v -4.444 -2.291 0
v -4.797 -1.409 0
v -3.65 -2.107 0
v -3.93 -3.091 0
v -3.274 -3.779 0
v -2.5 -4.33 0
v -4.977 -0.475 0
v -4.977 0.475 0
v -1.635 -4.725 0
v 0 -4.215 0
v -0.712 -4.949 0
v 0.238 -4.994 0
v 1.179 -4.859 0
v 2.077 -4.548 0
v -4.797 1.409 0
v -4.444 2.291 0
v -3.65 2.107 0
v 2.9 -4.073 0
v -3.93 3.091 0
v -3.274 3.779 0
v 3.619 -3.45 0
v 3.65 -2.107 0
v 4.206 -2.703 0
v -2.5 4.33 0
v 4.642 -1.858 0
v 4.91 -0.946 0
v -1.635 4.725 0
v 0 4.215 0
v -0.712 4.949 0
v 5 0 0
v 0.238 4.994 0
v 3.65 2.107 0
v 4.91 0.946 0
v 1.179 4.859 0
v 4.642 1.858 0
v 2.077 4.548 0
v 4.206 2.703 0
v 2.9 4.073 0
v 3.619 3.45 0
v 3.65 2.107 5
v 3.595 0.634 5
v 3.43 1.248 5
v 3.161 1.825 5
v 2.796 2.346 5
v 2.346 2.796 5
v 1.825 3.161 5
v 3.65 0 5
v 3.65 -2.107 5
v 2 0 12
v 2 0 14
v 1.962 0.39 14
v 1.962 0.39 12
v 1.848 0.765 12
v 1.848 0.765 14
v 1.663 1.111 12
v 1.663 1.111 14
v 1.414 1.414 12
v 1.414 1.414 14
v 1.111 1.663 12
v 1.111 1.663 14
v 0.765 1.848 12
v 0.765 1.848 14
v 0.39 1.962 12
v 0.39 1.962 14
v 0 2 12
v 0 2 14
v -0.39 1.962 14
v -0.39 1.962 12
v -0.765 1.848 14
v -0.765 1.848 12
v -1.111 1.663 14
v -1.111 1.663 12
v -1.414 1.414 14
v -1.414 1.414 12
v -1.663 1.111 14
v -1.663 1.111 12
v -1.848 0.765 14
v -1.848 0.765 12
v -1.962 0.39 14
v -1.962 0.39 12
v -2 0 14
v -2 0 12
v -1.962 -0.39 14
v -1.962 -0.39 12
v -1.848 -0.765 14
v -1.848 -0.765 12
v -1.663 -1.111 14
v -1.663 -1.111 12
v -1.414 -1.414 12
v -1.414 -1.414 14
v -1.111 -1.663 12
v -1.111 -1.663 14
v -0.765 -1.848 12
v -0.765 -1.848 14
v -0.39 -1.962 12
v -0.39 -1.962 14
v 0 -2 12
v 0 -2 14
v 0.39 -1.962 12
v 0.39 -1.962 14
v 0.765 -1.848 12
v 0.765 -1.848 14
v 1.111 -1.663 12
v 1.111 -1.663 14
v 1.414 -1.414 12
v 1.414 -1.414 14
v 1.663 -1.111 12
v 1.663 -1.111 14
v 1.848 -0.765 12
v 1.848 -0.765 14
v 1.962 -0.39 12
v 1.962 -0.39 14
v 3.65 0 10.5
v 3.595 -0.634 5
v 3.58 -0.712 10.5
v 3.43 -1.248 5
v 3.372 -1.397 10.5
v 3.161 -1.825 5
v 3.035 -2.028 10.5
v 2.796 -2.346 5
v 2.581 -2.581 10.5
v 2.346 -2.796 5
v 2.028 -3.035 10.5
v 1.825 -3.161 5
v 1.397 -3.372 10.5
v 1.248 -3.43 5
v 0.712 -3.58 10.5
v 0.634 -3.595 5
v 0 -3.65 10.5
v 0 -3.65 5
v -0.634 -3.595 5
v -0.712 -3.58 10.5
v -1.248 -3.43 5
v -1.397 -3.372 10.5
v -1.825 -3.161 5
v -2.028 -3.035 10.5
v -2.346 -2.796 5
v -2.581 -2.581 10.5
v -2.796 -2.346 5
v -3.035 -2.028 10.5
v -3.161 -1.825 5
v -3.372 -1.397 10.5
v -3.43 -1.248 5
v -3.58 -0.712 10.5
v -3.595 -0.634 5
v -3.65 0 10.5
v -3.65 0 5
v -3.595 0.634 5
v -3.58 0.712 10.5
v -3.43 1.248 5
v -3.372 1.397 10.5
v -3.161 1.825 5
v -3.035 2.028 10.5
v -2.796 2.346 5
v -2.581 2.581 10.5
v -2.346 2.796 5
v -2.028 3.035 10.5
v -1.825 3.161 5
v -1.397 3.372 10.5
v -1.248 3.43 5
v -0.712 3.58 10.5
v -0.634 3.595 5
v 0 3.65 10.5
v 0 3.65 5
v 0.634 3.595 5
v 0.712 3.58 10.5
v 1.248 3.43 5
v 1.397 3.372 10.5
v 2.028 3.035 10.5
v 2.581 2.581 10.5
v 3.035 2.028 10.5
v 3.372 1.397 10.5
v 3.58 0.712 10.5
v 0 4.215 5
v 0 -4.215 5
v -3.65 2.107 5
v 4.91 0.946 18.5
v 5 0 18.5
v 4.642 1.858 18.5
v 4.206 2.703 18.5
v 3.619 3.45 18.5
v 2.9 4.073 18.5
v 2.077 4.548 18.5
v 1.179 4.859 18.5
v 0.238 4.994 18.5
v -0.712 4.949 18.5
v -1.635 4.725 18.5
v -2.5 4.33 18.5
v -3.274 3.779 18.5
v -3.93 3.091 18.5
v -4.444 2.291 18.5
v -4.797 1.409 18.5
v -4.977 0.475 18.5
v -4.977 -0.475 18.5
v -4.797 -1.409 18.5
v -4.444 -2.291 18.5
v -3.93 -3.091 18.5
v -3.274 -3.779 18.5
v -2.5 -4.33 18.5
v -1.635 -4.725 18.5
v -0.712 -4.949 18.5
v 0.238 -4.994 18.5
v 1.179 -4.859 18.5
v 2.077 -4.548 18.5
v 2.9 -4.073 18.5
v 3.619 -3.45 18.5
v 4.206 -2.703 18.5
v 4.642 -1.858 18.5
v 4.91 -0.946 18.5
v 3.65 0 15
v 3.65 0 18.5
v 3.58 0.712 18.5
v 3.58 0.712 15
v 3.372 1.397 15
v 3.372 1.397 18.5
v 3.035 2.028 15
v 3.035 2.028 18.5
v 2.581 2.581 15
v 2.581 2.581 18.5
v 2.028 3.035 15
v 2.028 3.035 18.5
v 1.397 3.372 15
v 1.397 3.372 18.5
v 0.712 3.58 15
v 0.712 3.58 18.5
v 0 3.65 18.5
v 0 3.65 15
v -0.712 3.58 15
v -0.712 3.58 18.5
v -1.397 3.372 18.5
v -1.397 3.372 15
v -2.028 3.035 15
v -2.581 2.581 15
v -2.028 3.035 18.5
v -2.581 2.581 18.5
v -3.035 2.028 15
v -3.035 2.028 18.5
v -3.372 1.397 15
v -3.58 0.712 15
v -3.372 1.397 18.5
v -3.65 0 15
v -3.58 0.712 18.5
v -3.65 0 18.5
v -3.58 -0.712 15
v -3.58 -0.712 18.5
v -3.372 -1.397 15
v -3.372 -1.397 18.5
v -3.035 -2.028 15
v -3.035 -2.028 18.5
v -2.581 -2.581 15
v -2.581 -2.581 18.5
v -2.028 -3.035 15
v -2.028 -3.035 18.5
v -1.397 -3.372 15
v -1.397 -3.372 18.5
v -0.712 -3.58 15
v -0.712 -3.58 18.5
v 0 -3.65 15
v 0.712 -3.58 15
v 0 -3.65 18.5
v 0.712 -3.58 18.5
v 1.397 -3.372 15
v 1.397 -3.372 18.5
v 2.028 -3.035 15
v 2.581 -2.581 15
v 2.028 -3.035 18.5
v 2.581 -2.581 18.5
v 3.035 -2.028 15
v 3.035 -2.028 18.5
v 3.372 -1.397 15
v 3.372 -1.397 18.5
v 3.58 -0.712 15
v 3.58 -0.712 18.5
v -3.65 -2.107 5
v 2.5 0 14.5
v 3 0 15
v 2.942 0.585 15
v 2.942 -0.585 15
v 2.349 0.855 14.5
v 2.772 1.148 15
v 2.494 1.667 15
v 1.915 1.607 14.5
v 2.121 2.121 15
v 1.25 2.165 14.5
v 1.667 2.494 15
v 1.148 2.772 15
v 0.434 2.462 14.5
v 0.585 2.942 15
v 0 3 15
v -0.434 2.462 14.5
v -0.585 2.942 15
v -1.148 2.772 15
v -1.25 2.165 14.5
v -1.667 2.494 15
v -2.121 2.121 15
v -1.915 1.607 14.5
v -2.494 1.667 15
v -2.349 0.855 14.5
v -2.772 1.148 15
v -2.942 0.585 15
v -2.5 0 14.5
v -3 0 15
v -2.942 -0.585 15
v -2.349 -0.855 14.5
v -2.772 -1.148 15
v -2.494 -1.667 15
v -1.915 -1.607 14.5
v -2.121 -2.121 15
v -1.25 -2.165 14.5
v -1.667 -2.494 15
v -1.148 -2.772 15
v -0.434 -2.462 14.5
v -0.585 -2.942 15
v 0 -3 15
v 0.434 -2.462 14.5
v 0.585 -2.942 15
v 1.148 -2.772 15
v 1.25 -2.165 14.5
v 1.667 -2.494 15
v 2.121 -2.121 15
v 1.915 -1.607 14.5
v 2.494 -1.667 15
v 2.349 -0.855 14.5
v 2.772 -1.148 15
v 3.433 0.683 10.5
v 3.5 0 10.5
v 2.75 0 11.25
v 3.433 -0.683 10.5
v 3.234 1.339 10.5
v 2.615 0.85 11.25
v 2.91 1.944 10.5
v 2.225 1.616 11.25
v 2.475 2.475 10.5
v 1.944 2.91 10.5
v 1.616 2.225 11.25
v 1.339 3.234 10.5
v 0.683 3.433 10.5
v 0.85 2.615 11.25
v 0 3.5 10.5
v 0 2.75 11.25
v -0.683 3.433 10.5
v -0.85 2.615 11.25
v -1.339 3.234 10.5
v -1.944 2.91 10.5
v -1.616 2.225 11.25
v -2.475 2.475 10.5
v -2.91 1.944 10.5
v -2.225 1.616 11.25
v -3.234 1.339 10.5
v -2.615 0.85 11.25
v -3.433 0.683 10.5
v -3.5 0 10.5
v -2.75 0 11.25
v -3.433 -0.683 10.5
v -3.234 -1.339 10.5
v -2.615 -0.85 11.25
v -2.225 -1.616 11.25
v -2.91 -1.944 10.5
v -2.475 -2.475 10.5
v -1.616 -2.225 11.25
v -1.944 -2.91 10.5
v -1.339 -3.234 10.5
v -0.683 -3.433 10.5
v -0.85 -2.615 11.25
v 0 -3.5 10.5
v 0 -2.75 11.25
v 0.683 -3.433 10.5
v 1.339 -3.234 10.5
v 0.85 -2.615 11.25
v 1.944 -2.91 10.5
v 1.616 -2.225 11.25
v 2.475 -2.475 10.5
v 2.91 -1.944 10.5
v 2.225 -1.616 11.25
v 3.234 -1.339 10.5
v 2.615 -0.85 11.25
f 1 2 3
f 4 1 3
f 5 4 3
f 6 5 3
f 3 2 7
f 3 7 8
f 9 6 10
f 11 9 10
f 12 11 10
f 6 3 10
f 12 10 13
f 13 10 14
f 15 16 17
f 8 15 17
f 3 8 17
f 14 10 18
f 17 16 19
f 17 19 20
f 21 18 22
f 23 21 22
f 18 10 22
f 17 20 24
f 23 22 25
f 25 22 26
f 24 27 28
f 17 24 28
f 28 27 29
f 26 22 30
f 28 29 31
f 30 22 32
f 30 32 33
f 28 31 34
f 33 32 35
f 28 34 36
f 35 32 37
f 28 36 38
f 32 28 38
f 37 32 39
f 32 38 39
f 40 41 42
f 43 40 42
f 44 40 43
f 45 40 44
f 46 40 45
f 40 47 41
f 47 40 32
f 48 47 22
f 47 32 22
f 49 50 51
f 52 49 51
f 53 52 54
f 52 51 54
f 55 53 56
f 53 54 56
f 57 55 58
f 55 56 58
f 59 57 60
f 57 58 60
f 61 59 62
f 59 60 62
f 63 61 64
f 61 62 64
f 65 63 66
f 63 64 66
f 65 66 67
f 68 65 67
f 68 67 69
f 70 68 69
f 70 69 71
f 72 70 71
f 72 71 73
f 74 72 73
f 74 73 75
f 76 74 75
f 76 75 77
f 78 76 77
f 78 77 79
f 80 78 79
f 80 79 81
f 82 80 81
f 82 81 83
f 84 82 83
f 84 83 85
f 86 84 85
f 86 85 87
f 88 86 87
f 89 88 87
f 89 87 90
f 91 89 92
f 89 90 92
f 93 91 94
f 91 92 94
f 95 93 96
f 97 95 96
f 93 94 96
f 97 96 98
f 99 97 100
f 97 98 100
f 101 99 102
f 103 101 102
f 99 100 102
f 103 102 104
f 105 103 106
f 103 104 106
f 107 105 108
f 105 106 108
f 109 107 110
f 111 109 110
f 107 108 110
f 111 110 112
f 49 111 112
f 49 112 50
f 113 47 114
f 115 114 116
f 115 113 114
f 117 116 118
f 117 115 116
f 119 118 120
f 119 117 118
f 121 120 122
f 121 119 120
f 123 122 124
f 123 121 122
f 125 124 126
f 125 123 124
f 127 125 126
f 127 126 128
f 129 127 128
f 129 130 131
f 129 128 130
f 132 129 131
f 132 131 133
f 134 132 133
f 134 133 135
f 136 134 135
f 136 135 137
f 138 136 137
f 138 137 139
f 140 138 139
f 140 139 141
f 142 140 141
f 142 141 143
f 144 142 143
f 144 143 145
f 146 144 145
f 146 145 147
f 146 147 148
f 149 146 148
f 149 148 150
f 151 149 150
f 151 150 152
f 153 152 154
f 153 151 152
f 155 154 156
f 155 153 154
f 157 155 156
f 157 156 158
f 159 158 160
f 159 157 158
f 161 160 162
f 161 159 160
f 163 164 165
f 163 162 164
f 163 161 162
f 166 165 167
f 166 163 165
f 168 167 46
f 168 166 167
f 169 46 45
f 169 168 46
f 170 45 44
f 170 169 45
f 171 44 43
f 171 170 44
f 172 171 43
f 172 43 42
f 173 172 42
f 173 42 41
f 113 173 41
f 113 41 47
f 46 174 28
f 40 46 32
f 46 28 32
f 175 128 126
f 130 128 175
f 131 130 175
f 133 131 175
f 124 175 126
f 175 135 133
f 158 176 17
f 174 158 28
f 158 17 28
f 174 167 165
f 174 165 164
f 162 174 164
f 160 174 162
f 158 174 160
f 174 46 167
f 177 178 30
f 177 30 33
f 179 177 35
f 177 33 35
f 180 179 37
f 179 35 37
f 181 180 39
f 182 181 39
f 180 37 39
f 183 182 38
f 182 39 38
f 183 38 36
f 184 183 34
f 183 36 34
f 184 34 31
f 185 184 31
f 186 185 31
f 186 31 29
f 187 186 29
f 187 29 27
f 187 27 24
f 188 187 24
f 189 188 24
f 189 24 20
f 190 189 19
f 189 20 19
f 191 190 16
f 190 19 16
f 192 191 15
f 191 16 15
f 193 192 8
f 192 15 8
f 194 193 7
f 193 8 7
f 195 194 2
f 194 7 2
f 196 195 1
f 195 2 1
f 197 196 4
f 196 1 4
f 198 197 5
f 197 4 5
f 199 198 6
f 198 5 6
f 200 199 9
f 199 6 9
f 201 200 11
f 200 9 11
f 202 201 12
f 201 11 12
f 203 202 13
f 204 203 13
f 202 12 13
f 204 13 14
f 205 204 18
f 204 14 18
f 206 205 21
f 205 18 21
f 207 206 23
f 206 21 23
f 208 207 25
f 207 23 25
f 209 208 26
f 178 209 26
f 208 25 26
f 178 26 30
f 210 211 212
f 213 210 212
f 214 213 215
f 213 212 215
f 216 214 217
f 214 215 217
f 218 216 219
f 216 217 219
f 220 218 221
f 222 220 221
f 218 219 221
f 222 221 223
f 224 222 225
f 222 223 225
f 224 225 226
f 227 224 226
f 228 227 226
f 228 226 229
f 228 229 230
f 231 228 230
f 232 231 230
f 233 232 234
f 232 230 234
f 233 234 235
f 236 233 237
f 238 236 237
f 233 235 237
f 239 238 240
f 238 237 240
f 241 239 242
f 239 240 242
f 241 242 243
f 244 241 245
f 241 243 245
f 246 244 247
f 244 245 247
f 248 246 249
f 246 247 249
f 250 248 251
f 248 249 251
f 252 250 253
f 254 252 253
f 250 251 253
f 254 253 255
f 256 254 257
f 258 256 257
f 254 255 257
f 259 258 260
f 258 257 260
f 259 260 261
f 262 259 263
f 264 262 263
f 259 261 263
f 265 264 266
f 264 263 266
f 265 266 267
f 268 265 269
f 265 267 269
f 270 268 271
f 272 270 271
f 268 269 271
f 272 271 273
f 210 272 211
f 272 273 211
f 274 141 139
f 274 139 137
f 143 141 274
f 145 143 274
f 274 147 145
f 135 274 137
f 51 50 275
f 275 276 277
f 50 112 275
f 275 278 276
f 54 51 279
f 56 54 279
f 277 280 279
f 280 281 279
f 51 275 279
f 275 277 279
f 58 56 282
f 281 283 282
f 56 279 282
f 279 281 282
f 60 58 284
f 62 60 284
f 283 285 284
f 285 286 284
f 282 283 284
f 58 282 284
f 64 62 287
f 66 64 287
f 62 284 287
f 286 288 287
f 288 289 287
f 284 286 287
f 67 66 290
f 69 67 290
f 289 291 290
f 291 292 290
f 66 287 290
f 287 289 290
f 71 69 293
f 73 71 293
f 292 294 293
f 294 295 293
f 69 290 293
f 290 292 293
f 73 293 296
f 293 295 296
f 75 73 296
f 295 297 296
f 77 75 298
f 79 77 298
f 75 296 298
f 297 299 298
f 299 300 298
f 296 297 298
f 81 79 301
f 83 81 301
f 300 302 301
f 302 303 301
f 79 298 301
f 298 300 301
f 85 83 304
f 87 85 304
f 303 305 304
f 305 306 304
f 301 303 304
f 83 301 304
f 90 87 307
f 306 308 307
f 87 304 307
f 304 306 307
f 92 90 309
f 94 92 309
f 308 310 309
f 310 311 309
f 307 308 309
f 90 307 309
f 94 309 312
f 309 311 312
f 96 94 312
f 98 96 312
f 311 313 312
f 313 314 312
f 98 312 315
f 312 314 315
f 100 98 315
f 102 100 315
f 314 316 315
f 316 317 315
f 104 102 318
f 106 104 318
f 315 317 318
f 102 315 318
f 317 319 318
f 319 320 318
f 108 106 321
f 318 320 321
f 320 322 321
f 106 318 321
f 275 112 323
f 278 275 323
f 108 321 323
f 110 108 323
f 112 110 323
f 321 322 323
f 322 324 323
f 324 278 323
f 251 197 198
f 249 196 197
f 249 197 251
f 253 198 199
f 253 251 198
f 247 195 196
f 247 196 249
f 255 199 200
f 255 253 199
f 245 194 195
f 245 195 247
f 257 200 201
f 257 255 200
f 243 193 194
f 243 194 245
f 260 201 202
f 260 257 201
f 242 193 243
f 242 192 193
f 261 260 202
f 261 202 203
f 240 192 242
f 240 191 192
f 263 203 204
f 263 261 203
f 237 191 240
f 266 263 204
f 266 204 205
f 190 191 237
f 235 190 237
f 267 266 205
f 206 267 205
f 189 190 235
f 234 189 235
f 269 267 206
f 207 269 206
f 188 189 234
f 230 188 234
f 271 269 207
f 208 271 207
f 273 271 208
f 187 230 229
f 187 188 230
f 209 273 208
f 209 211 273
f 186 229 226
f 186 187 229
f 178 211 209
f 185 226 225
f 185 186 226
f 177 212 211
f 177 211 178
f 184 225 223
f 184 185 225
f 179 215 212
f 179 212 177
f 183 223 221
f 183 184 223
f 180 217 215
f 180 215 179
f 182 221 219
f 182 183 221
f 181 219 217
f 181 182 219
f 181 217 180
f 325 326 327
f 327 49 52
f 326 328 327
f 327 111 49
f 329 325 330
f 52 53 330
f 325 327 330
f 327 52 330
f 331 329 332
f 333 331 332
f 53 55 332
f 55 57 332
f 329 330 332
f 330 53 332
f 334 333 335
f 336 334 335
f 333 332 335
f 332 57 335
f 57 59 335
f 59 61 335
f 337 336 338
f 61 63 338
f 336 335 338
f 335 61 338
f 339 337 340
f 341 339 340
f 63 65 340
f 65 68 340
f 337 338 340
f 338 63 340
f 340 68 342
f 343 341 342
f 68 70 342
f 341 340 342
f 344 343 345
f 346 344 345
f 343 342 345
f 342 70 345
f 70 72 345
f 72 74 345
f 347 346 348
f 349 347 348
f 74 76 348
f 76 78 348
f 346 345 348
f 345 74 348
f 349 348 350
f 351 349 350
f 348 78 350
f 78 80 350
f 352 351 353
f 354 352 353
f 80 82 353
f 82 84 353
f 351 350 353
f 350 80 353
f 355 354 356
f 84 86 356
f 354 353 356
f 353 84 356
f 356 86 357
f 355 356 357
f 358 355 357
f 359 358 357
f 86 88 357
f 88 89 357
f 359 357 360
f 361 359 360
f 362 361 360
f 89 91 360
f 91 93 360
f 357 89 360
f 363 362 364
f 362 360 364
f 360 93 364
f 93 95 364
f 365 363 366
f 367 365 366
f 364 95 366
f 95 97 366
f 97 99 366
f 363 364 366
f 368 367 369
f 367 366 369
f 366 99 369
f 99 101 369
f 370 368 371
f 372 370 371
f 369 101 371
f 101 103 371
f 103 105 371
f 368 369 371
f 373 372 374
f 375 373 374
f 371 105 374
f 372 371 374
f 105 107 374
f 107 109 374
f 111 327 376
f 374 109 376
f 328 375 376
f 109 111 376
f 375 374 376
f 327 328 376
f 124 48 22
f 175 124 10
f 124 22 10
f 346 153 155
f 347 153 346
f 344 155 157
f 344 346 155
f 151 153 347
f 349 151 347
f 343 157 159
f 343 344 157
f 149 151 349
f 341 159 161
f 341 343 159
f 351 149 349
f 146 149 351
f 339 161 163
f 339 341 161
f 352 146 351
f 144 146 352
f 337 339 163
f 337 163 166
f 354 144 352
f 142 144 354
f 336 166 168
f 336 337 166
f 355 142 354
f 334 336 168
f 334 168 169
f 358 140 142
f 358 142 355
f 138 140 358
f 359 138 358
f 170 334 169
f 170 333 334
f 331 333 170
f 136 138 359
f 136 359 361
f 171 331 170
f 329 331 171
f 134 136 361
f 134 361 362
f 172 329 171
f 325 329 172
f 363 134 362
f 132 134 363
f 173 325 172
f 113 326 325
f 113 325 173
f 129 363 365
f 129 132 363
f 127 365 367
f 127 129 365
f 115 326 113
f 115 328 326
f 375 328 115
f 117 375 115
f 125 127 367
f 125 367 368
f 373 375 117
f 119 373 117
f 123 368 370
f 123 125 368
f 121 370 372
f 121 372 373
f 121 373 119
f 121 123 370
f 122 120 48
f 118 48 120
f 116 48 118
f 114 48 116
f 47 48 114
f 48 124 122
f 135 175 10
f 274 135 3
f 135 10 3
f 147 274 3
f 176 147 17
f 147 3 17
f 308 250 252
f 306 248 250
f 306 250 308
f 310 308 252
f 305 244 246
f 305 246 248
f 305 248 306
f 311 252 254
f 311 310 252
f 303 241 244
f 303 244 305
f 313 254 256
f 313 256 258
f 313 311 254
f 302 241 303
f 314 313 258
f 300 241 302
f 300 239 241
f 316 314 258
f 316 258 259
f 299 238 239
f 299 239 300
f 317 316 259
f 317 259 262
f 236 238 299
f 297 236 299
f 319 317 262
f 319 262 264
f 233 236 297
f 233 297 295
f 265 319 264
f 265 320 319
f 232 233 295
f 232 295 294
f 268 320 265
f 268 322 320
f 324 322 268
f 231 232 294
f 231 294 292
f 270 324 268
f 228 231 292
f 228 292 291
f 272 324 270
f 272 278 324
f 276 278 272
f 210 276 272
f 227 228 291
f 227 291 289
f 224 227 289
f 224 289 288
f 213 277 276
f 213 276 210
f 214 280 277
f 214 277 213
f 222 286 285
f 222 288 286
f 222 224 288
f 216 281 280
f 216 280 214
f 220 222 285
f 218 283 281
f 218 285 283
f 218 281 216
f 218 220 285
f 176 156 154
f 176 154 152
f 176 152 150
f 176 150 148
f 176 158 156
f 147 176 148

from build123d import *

# Parameters (mm, degrees)
SKETCH1_R           = 5
BOSS_EXTRUDE1_DEPTH = 18.5
SKETCH2_R           = 2
CUT_EXTRUDE1_DEPTH  = 18.5
SKETCH3_R           = 3.65
CUT_EXTRUDE2_DEPTH  = 3.5
CUT_EXTRUDE3_START  = -10.5
SKETCH4_R           = 3.65
CUT_EXTRUDE3_DEPTH  = 10.5
CHAMFER1_SIZE       = 1.5
CHAMFER2_SIZE       = 1
CUT_EXTRUDE4_DEPTH  = 5


with BuildPart() as part:
    # Sketch1 → Boss-Extrude1 (new body)
    with BuildSketch(Plane.XY):
        Circle(SKETCH1_R)
    extrude(amount=BOSS_EXTRUDE1_DEPTH)

    # Sketch2 → Cut-Extrude1 (cut)
    with BuildSketch(Plane.XY.offset(18.5)):
        Circle(SKETCH2_R)
    extrude(amount=-CUT_EXTRUDE1_DEPTH, mode=Mode.SUBTRACT)

    # Sketch3 → Cut-Extrude2 (cut)
    with BuildSketch(Plane.XY.offset(18.5)):
        Circle(SKETCH3_R)
    extrude(amount=-CUT_EXTRUDE2_DEPTH, mode=Mode.SUBTRACT)

    # Sketch4 → Cut-Extrude3 (cut)
    with BuildSketch(Plane(origin=(0, 0, 0), x_dir=(-1, 0, 0), z_dir=(0, 0, -1)).offset(CUT_EXTRUDE3_START)):
        with Locations(Location((0, 0, 0), (0, 0, 180))):
            Circle(SKETCH4_R)
    extrude(amount=CUT_EXTRUDE3_DEPTH, mode=Mode.SUBTRACT)

    # Chamfer1
    chamfer1_edges = [part.edges().sort_by_distance(p)[0] for p in [
        (-2, 0, 10.5),
    ]]
    chamfer(chamfer1_edges, length=CHAMFER1_SIZE)

    # Chamfer2
    chamfer2_edges = [part.edges().sort_by_distance(p)[0] for p in [
        (-2, 0, 15),
    ]]
    chamfer(chamfer2_edges, length=CHAMFER2_SIZE)

    # Sketch5 → Cut-Extrude4 (cut)
    with BuildSketch(Plane(origin=(0, 0, 0), x_dir=(-1, 0, 0), z_dir=(0, 0, -1))):
        Polygon((0, 4.214656965), (-3.65, 2.107328483), (-3.65, -2.107328483), (0, -4.214656965), (3.65, -2.107328483), (3.65, 2.107328483), align=None)
    extrude(amount=-CUT_EXTRUDE4_DEPTH, mode=Mode.SUBTRACT)


solid = part.part
